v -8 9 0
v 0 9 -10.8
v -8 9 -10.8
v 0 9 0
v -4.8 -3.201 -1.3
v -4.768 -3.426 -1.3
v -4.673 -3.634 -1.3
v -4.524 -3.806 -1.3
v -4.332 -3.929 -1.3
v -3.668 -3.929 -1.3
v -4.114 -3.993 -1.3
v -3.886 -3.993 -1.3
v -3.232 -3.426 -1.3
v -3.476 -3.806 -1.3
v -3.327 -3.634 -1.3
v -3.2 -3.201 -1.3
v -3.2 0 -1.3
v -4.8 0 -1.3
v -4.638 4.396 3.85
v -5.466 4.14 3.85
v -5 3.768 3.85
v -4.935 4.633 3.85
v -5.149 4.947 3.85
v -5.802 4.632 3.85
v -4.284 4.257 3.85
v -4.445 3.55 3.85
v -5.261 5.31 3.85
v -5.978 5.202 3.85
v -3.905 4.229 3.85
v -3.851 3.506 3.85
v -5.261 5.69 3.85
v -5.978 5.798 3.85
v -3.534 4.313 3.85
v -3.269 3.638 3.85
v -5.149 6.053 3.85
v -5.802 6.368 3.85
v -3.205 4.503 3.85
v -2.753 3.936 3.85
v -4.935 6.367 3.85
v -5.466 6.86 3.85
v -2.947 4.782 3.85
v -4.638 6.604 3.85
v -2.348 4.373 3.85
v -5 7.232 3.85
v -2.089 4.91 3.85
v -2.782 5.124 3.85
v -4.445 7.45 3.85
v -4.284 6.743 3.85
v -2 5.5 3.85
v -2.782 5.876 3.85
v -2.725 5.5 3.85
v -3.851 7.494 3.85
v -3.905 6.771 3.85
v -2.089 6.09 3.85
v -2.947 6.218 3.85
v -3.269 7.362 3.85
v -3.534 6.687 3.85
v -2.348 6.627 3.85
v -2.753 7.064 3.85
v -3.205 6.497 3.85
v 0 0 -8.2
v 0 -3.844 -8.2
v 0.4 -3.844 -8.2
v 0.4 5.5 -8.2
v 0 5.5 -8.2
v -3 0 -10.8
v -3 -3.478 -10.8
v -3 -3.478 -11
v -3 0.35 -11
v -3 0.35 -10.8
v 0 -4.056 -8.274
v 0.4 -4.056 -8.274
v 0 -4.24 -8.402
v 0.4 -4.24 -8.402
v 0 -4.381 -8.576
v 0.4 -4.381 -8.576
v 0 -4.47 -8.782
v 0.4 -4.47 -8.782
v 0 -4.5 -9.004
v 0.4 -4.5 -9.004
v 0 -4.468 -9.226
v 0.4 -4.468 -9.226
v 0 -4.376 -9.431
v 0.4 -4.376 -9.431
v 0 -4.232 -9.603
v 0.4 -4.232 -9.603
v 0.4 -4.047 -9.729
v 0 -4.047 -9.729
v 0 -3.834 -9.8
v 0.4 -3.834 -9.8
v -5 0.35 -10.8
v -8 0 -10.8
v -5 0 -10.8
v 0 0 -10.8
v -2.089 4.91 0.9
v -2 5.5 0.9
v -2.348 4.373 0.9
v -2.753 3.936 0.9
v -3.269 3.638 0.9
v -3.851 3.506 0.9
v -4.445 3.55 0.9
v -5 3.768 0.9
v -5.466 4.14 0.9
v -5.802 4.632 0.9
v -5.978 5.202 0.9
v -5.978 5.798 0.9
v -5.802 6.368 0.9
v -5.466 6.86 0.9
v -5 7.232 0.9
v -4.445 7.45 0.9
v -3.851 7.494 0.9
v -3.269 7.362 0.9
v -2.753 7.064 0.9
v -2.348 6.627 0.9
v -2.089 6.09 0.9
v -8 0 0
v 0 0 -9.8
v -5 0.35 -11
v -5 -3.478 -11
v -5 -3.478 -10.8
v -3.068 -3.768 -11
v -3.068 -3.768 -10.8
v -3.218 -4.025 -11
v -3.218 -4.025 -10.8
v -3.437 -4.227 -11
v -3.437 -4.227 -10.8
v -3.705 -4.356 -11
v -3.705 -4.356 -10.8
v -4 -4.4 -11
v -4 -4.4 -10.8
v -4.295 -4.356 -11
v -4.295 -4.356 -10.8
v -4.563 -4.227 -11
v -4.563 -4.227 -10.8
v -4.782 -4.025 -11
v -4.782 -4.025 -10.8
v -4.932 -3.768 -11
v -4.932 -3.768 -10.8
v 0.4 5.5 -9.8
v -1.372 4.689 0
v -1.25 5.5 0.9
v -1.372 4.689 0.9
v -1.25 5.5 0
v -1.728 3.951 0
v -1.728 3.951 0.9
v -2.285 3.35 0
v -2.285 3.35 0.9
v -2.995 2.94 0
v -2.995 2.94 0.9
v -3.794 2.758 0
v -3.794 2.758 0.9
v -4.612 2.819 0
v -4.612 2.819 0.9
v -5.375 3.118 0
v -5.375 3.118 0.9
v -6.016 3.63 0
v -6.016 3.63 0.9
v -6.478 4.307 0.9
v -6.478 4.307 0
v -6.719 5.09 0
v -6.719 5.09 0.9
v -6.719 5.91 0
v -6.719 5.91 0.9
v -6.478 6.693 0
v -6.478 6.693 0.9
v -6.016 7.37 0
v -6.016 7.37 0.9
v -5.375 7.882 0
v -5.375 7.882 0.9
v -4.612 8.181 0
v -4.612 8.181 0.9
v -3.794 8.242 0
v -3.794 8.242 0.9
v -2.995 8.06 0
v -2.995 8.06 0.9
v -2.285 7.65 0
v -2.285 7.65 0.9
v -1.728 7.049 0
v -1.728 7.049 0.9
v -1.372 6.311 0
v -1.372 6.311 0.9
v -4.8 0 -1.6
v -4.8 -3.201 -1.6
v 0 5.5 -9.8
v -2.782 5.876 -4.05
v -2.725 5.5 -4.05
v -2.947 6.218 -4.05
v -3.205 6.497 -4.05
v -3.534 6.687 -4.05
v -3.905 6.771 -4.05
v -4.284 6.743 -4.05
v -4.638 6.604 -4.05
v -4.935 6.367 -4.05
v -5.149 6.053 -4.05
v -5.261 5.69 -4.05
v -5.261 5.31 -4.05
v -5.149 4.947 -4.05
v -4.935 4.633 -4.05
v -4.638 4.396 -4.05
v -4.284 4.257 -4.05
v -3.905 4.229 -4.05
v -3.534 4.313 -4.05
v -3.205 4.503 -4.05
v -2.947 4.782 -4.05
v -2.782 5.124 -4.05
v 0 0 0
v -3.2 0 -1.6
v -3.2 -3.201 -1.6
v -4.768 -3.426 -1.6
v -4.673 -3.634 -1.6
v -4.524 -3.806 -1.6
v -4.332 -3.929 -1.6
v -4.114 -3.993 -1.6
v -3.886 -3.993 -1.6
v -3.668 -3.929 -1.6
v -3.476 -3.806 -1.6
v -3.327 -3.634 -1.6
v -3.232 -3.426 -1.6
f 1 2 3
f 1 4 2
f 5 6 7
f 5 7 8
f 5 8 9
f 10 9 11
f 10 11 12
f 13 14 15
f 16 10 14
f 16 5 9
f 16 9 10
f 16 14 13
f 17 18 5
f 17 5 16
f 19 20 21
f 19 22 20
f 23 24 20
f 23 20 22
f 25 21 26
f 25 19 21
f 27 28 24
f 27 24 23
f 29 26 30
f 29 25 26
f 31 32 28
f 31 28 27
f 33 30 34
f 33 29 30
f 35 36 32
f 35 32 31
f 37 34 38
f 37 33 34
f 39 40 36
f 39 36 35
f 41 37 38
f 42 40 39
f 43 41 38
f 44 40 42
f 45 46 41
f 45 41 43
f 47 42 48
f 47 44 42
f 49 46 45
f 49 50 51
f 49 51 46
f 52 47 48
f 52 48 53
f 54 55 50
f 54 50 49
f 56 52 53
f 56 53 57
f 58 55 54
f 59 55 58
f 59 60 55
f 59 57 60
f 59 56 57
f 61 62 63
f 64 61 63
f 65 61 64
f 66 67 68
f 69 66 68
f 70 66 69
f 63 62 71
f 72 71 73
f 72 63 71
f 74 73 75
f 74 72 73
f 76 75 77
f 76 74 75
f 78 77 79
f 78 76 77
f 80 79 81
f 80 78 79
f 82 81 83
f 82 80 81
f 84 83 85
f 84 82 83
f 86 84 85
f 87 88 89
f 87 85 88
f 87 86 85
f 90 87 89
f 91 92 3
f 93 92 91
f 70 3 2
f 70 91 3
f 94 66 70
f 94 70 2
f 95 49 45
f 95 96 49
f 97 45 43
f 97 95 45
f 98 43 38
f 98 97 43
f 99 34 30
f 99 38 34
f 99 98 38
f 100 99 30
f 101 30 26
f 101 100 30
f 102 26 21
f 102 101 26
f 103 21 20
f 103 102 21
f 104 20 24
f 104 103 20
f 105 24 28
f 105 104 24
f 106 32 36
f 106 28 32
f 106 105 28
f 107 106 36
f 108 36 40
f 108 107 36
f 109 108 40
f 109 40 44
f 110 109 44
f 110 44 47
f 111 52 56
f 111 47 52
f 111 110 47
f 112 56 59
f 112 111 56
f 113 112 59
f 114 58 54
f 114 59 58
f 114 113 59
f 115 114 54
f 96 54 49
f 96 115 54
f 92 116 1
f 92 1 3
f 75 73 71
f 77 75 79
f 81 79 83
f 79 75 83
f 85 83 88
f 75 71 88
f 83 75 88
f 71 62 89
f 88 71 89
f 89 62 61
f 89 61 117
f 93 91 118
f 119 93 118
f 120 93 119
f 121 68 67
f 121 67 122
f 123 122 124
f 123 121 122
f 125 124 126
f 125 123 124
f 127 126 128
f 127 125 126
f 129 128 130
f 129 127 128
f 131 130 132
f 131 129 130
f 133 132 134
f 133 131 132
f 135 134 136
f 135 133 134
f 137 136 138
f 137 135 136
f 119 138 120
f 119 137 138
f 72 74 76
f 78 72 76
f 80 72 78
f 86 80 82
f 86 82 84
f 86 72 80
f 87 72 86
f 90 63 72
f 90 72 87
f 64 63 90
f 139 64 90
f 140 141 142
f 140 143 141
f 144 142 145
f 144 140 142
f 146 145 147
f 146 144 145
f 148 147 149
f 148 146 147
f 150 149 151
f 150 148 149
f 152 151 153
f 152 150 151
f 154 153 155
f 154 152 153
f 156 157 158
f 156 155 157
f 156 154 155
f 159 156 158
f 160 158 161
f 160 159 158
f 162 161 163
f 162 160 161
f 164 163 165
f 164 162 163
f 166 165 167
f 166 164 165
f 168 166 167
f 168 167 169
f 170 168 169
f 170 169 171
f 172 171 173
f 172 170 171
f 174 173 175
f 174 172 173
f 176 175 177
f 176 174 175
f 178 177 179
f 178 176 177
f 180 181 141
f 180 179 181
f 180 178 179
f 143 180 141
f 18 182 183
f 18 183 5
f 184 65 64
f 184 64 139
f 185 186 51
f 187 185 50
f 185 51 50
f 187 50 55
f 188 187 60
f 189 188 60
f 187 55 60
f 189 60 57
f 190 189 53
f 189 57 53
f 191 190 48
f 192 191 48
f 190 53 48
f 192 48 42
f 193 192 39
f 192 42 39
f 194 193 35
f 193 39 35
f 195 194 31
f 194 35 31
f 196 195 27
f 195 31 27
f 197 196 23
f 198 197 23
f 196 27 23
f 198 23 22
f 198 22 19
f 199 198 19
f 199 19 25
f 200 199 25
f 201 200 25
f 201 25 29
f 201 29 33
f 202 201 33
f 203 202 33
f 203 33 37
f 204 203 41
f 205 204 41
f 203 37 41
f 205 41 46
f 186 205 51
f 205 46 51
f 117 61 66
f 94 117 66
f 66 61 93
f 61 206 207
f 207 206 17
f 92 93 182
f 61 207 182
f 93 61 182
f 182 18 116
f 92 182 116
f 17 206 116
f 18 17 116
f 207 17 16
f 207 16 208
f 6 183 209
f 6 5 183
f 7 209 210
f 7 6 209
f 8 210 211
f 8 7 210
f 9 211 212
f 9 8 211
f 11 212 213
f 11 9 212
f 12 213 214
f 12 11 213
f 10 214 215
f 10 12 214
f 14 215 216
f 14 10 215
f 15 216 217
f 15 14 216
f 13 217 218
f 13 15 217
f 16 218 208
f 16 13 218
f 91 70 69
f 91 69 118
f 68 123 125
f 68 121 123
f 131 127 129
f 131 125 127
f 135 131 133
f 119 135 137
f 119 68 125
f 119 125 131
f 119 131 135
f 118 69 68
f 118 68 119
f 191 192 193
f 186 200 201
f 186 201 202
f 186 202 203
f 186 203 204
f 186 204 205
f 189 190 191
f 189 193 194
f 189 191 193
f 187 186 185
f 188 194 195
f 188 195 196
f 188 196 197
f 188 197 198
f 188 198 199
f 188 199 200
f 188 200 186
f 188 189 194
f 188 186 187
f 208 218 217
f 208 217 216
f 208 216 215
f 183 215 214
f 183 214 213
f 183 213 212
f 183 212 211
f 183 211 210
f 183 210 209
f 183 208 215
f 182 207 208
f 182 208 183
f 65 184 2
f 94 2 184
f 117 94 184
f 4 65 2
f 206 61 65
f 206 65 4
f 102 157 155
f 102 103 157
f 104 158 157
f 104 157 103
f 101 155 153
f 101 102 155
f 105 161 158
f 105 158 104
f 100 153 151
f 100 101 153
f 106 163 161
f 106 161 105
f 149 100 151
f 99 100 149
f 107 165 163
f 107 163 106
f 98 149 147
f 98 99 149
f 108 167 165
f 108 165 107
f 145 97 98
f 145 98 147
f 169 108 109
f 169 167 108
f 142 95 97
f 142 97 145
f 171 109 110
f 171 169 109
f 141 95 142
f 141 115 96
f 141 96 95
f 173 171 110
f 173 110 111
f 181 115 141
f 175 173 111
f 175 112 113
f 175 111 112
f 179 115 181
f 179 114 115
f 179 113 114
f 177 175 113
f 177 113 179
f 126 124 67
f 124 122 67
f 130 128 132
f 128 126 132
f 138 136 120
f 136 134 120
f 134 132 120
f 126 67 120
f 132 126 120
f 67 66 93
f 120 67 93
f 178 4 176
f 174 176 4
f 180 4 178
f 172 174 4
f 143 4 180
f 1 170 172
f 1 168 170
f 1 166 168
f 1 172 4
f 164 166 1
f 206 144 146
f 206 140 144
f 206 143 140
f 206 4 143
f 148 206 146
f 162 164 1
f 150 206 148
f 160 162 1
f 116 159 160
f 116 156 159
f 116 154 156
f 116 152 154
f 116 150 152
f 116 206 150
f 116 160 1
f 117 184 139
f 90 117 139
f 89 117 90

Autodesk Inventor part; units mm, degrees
ref_plane "YZ Plane" through (0, 0, 0) normal (1, 0, 0) x (0, 1, 0)
ref_plane "XZ Plane" through (0, 0, 0) normal (0, 1, 0) x (-1, 0, 0)
ref_plane "XY Plane" through (0, 0, 0) normal (0, 0, 1) x (1, 0, 0)
sketch "Эскиз1" plane through (0, 0, 0) normal (0, 1, 0) x (-1, 0, 0)
  line L0 (0, 0) -> (8, 0)
  line L1 (8, 0) -> (8, -10.8)
  line L2 (8, -10.8) -> (0, -10.8)
  line L3 (0, -10.8) -> (0, 0)
  dimension "d0" = 10.8
  dimension "d1" = 8
extrude "Выдавливание1" add sketch "Эскиз1" along normal blind 9
sketch "Эскиз2" plane through (-8, 0, 0) normal (0, 0, 1) x (1, 0, 0)
  circle A0 centre (4, 5.5) radius 2.75
  line L0 (8, 0) -> (8, 9) projected
  line L1 (0, 0) -> (8, 0) projected
  dimension "d4" = 5.5
  dimension "d5" = 4
  dimension "d6" = 5.5
extrude "Выдавливание2" add sketch "Эскиз2" along normal blind 0.9
sketch "Эскиз3" plane through (-4, 5.5, 0.9) normal (0, 0, 1) x (1, 0, 0)
  circle A0 centre (0, 0) radius 2
  point P0 (4, -5.5)
  dimension "d9" = 4
extrude "Выдавливание3" add sketch "Эскиз3" along normal blind 2.95
sketch "Эскиз4" plane through (-4, 5.5, 3.85) normal (0, 0, 1) x (1, 0, 0)
  circle A0 centre (0, 0) radius 2.75 projected
  circle A1 centre (0, 0) radius 1.275
  point P0 (4, -5.5)
  dimension "d12" = 2.55
extrude "Выдавливание4" cut sketch "Эскиз4" against normal blind 7.9 contours A1
sketch "Эскиз5" plane through (-8, 0, 0) normal (0, 0, 1) x (1, 0, 0)
  point P0 (8, 0)
sketch "Эскиз6" plane through (0, 0, 0) normal (0, -1, 0) x (1, 0, 0)
  line L0 (-4.8, -1.3) -> (-3.2, -1.3)
  line L1 (-3.2, -1.3) -> (-3.2, -1.6)
  line L2 (-3.2, -1.6) -> (-4.8, -1.6)
  line L3 (-4.8, -1.6) -> (-4.8, -1.3)
  line L4 (0, 0) -> (0, -10.8) projected
  line L5 (-8, 0) -> (0, 0) projected
  line L6 (0, -10.8) -> (-8, -10.8) projected
  dimension "d15" = 1.6
  dimension "d16" = 0.3
  dimension "d17" = 3.2
  dimension "d39" = 9.2
extrude "Выдавливание5" add sketch "Эскиз6" along normal blind 4
sketch "Эскиз7" plane through (-4.8, 0, -1.3) normal (0, 0, 1) x (1, 0, 0)
  line L0 (0, 0) -> (0, -4) projected
  line L1 (1.6, 0) -> (1.6, -4) projected
  arc A0 (0, -3.2011) -> (1.6, -3.2011) centre (0.8, -3.2011) ccw
  line L2 (0, -3.2011) -> (0, -4)
  line L3 (1.6, -4) -> (0, -4) projected
  line L4 (1.6, -4) -> (1.6, -3.2011)
  point P0 (4.8, 0)
  point P1 (0.7588, -4)
  point P2 (0.8412, -4)
extrude "Выдавливание6" cut sketch "Эскиз7" against normal blind 4
sketch "Эскиз8" plane through (0, 0, 0) normal (1, 0, 0) x (0, 0, -1)
  line L0 (8.2, 5.5) -> (9.8, 5.5)
  line L1 (9.8, 5.5) -> (9.8, -4.5)
  line L2 (9.8, -4.5) -> (8.2, -4.5)
  line L3 (8.2, -4.5) -> (8.2, 5.5)
  line L4 (0, 9) -> (10.8, 9) projected
  line L5 (0, 0) -> (0, 9) projected
  dimension "d23" = 1.6
  dimension "d24" = 3.5
  dimension "d25" = 8.2
  dimension "d26" = 10
extrude "Выдавливание7" add sketch "Эскиз8" along normal blind 0.4
sketch "Эскиз9" plane through (0.4, 0, 0) normal (1, 0, 0) x (0, 0, -1)
  line L0 (8.2, 0) -> (8.2, -4.5) projected
  line L1 (9.8, -4.5) -> (9.8, 0) projected
  arc A0 (8.2, -3.8439) -> (9.8, -3.8337) centre (8.999, -3.6854) ccw
  line L2 (8.2, -3.8439) -> (8.2, -4.5)
  line L3 (8.2, -4.5) -> (9.8, -4.5) projected
  line L4 (9.8, -4.5) -> (9.8, -3.8337)
  point P0 (0, 0)
  point P1 (8.9981, -4.5)
extrude "Выдавливание8" cut sketch "Эскиз9" against normal blind 0.4
sketch "Эскиз10" plane through (0, 0, -10.8) normal (0, 0, -1) x (-1, 0, 0)
  line L0 (3, 0.35) -> (5, 0.35)
  line L1 (5, 0.35) -> (5, -4.4)
  line L2 (5, -4.4) -> (3, -4.4)
  line L3 (3, -4.4) -> (3, 0.35)
  line L4 (8, 0) -> (8, 9) projected
  line L5 (0, 0) -> (8, 0) projected
  dimension "d31" = 2
  dimension "d32" = 3
  dimension "d33" = 4.75
  dimension "d34" = 0.35
extrude "Выдавливание9" add sketch "Эскиз10" along normal blind 0.2
sketch "Эскиз11" plane through (0, 0, -11) normal (0, 0, -1) x (-1, 0, 0)
  line L0 (3, 0.35) -> (3, -4.4) projected
  line L1 (5, -4.4) -> (5, 0.35) projected
  arc A0 (3, -3.4779) -> (5, -3.4779) centre (4, -3.3967) ccw
  line L2 (3, -4.4) -> (5, -4.4) projected
  line L3 (3, -3.4779) -> (3, -4.4)
  line L4 (3, -4.4) -> (5, -4.4)
  line L5 (5, -4.4) -> (5, -3.4779)
  point P0 (0, 0)
  point P1 (4, -4.4)
extrude "Выдавливание10" cut sketch "Эскиз11" against normal blind 0.2
properties part number "PY-401N"
